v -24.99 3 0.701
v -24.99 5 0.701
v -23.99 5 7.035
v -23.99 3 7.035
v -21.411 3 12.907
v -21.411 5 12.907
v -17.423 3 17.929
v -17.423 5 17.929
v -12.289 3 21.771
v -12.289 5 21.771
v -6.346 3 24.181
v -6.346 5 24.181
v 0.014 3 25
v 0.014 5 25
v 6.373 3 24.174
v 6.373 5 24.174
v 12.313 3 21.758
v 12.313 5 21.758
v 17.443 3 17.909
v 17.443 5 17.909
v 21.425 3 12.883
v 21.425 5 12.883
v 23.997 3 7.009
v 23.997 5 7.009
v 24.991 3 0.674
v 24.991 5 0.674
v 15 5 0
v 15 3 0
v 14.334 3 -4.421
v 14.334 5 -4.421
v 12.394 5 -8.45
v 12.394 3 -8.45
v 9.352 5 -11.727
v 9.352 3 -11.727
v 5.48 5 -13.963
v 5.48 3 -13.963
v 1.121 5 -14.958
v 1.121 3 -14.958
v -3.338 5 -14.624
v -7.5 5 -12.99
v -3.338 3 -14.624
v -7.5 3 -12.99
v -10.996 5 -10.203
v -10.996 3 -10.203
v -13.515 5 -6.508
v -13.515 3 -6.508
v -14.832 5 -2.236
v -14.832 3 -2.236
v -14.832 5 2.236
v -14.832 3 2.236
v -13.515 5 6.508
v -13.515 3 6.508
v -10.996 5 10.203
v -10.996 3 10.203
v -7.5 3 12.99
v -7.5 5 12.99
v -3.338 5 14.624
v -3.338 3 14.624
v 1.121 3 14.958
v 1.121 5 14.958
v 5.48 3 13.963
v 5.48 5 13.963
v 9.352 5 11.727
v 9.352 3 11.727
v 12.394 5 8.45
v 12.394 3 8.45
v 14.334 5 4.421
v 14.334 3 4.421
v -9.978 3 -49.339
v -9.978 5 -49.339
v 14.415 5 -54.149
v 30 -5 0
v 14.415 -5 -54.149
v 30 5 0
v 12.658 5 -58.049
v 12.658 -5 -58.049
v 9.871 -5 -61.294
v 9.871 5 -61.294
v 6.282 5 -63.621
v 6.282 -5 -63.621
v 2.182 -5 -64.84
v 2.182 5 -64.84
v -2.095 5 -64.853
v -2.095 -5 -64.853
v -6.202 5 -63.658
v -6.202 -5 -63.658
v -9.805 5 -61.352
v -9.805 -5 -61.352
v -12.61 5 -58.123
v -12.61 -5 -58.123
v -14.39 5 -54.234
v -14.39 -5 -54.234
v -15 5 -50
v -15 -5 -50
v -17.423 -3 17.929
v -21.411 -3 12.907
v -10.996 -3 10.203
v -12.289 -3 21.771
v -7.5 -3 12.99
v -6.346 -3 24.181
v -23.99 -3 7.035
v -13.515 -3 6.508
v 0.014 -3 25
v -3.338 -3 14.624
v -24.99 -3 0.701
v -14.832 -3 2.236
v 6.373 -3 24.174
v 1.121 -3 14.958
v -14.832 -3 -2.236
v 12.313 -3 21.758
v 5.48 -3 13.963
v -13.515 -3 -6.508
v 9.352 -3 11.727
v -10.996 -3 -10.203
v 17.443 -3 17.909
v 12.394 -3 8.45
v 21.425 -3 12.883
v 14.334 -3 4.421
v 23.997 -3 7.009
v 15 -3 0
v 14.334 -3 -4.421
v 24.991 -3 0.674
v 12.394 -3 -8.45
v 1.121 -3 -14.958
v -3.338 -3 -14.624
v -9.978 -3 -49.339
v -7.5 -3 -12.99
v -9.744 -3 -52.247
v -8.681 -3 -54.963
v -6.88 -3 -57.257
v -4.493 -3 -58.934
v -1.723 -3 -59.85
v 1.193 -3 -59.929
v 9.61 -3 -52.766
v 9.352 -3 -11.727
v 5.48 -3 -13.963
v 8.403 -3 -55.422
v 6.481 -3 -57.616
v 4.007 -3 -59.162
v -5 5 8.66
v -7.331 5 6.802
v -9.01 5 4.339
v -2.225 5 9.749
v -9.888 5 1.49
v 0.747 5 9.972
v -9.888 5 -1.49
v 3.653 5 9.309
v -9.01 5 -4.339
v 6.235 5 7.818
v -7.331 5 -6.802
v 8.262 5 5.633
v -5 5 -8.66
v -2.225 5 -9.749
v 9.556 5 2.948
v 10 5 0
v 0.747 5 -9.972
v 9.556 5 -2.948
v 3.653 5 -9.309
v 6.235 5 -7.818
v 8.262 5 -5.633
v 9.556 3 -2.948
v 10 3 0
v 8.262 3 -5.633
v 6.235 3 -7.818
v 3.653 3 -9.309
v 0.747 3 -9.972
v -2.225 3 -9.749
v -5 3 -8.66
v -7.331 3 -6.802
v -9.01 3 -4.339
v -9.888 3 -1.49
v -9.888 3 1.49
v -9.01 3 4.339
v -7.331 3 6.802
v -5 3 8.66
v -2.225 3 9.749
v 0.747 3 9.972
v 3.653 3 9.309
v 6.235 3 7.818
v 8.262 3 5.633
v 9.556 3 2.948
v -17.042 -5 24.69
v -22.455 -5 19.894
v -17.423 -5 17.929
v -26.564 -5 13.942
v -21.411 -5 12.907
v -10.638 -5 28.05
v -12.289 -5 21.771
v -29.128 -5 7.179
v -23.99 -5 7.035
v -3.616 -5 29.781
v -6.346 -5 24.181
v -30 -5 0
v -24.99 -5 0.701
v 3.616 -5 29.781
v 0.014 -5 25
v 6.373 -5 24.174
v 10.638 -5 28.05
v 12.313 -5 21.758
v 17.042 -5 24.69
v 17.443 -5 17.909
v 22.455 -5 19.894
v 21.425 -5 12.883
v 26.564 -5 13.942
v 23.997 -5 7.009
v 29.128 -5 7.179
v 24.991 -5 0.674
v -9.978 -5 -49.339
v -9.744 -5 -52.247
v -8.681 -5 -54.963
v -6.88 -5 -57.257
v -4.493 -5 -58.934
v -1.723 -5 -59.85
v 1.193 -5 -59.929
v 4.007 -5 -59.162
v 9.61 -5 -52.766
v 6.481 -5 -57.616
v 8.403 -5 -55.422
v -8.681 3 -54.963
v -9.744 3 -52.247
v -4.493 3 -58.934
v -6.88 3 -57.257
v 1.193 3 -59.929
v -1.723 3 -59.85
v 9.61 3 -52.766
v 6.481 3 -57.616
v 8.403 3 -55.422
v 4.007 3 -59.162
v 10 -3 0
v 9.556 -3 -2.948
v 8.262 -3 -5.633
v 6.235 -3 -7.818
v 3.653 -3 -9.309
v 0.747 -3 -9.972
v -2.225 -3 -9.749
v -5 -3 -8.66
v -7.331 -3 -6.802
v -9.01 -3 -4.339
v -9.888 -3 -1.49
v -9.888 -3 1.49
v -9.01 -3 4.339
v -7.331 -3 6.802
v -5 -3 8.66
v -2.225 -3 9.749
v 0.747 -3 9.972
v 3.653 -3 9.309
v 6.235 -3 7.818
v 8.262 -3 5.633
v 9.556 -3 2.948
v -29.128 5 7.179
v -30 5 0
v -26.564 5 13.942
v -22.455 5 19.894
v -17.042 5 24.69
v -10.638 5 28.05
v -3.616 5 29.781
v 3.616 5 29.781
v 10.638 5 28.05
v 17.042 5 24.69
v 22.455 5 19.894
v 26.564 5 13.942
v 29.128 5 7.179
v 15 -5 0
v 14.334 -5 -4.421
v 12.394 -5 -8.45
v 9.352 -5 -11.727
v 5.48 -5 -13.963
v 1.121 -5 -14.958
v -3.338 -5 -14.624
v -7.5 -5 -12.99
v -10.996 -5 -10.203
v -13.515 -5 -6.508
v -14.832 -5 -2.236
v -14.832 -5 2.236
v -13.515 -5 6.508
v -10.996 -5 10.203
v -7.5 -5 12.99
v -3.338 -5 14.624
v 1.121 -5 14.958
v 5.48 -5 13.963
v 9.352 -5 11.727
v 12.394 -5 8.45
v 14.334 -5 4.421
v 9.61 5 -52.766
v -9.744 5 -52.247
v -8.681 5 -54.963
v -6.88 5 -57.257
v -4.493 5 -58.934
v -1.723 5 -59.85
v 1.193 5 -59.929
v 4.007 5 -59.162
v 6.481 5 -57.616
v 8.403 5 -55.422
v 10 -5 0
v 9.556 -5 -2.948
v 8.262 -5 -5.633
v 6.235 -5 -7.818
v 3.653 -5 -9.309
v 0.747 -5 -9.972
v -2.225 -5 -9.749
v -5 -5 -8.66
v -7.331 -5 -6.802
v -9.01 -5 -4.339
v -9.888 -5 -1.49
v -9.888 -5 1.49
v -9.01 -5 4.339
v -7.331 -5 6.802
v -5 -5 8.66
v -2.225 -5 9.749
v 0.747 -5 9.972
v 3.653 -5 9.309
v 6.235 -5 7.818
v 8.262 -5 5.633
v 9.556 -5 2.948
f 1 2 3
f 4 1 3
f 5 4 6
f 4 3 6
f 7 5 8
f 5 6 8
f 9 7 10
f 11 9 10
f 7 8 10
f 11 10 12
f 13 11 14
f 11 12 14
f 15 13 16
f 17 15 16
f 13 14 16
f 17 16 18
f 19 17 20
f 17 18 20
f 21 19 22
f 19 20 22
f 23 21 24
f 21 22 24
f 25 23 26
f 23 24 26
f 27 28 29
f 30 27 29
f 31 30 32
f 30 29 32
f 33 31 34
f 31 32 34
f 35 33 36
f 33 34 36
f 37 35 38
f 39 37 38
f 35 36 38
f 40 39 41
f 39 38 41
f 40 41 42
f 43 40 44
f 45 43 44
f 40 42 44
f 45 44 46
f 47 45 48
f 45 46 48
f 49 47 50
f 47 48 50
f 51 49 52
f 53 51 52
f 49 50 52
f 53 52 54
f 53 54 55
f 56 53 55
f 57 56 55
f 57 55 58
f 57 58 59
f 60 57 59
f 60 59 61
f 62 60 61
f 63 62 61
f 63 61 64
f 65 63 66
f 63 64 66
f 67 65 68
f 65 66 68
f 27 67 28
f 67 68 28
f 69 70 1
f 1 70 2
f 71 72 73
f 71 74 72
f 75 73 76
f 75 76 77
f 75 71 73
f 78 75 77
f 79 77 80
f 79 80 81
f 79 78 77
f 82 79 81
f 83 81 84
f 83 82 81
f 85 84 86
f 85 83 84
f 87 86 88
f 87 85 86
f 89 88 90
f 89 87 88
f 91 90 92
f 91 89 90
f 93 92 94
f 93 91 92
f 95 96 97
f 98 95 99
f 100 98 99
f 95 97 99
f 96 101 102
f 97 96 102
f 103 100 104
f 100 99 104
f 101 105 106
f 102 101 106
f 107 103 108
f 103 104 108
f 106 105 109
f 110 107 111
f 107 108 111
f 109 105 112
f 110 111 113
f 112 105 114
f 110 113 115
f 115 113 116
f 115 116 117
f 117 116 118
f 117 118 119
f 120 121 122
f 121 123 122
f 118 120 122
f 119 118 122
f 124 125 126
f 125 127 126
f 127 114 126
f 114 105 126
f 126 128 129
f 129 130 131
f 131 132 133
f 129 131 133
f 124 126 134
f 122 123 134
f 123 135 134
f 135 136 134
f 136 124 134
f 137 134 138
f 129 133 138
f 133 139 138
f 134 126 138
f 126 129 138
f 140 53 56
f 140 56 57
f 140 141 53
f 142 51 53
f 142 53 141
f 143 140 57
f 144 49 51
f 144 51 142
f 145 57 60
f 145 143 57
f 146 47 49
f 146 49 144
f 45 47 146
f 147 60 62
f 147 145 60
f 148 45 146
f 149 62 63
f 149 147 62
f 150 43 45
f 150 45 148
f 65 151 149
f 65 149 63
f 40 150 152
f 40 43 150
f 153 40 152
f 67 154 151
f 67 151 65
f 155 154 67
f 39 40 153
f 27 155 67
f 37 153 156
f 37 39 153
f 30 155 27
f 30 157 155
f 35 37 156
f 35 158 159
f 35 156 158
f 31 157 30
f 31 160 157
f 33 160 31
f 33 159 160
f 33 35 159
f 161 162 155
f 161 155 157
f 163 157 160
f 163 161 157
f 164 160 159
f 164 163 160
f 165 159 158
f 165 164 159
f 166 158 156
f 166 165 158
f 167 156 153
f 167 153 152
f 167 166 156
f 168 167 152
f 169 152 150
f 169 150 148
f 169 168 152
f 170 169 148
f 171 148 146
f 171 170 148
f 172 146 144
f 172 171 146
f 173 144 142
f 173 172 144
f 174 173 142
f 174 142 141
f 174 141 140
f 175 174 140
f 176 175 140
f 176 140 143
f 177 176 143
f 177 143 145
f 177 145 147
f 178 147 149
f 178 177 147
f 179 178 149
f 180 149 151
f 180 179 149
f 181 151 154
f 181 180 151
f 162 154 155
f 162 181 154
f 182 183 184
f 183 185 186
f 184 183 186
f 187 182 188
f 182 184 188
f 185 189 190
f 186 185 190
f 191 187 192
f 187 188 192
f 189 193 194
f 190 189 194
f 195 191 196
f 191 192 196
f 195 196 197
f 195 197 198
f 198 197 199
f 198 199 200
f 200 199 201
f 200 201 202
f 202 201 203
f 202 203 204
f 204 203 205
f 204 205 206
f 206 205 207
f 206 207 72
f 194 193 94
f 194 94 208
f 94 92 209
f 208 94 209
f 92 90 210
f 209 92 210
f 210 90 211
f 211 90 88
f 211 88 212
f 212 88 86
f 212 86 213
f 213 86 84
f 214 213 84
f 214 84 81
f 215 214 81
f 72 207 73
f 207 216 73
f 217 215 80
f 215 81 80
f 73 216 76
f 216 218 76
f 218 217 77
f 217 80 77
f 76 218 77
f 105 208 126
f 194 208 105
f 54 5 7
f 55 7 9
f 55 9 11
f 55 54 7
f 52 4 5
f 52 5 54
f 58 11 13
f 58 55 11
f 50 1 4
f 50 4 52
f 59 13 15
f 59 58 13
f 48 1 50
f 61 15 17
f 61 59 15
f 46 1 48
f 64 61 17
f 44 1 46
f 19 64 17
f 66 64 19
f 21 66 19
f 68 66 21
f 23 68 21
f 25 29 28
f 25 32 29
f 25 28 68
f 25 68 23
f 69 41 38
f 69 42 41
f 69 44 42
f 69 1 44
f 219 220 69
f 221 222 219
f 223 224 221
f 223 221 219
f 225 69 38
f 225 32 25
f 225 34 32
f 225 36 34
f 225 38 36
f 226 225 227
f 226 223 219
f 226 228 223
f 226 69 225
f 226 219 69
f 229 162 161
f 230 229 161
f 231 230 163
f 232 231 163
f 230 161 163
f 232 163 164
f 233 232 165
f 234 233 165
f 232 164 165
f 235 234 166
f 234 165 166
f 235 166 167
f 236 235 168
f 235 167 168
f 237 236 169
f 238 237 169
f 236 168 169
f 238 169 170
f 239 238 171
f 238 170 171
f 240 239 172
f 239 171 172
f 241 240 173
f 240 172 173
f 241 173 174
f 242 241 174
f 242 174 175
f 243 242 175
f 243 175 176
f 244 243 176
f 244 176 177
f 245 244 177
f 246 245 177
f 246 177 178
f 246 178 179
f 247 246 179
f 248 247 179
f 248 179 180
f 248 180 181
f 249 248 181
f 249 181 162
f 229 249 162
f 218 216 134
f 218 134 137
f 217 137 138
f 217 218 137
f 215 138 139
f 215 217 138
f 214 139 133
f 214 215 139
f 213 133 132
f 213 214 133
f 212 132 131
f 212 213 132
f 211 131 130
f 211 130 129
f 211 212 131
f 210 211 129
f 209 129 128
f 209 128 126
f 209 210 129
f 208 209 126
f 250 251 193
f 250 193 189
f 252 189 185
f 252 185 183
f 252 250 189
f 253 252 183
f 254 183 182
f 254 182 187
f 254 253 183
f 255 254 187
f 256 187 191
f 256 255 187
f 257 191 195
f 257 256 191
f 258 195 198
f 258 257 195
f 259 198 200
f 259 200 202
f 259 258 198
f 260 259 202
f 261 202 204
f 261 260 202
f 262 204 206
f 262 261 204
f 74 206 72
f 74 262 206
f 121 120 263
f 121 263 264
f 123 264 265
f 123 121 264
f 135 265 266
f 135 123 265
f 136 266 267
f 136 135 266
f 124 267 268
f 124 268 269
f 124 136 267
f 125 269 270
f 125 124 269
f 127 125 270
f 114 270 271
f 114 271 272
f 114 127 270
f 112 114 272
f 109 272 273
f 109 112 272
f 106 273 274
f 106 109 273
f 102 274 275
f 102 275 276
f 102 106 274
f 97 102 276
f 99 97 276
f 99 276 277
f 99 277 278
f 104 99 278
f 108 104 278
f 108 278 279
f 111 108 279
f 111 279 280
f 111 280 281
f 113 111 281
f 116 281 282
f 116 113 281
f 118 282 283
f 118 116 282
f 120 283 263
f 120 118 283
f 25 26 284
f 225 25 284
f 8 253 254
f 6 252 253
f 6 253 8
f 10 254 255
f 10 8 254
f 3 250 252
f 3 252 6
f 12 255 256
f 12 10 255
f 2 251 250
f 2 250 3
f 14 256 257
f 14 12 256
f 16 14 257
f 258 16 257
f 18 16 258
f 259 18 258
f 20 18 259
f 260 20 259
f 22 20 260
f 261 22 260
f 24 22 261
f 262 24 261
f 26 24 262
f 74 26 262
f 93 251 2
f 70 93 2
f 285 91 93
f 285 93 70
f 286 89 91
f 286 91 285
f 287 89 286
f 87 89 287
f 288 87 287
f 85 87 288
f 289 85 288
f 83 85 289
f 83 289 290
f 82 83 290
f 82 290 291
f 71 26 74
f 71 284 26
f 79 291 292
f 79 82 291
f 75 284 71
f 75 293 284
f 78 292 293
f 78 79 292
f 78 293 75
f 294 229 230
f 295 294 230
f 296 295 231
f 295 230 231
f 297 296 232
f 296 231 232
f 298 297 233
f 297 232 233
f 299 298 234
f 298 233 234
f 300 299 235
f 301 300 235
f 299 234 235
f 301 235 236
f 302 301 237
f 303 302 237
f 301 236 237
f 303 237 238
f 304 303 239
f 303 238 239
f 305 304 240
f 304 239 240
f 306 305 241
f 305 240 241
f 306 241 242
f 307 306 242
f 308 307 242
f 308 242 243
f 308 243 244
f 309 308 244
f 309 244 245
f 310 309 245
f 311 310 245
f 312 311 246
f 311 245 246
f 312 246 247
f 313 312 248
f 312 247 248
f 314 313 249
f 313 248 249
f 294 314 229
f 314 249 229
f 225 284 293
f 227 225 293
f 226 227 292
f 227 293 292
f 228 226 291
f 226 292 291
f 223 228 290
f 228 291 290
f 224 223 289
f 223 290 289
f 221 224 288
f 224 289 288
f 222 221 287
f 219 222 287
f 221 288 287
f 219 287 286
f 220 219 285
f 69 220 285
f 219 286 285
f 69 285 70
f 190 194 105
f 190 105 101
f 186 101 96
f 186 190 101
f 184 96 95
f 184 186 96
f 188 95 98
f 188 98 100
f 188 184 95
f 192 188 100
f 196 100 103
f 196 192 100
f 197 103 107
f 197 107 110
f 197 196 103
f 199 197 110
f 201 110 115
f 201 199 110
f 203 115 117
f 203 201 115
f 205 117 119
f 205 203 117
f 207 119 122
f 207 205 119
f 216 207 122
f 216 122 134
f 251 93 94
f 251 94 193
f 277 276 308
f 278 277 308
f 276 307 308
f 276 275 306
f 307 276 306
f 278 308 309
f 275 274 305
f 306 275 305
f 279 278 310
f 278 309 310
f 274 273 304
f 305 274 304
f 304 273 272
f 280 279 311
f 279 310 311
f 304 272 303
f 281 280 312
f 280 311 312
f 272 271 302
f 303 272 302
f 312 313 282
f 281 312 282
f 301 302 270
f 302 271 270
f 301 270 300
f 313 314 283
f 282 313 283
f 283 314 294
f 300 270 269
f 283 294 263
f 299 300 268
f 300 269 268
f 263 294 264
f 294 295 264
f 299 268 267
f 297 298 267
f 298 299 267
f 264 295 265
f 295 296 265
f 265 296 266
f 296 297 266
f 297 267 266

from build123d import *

# Parameters (mm, degrees)
BOSS_EXTRUDE1_DEPTH = 5
CUT_EXTRUDE1_DEPTH  = 2
SKETCH3_R           = 10
CUT_EXTRUDE2_DEPTH  = 9
SKETCH4_R           = 15
SKETCH4_R_2         = 10
BOSS_EXTRUDE2_DEPTH = 2


with BuildPart() as part:
    # Sketch1 → Boss-Extrude1 (new body, symmetric)
    with BuildSketch(Plane(origin=(0, 0, 0), x_dir=(1, 0, 0), z_dir=(0, 1, 0))):
        with BuildLine():
            ThreePointArc((14.41480993, 54.148885958), (-2.094976259, 64.852982006), (-15, 50))
            Line((-15, 50), (-30, 0))
            ThreePointArc((-30, 0), (0, -30), (30, 0))
            Line((30, 0), (14.41480993, 54.148885958))
        make_face()
    extrude(amount=BOSS_EXTRUDE1_DEPTH, both=True)

    # Sketch2 → Cut-Extrude1 (cut)
    with BuildSketch(Plane(origin=(0, 5, 0), x_dir=(1, 0, 0), z_dir=(0, 1, 0))):
        with BuildLine():
            Line((24.99092108, -0.673693969), (9.609873286, 52.765923972))
            ThreePointArc((9.609873286, 52.765923972), (-1.723304272, 59.850391992), (-9.978133058, 49.339045626))
            Line((-9.978133058, 49.339045626), (-24.990168055, -0.701071031))
            ThreePointArc((-24.990168055, -0.701071031), (0.013693708, -24.99999625), (24.99092108, -0.673693969))
        make_face()
    cut_extrude1 = extrude(amount=-CUT_EXTRUDE1_DEPTH, mode=Mode.SUBTRACT)

    # Mirror1: Cut-Extrude1 across plane
    add(cut_extrude1.mirror(Plane.ZX), mode=Mode.SUBTRACT)

    # Sketch3 → Cut-Extrude2 (cut, through all)
    with BuildSketch(Plane(origin=(0, 3, 0), x_dir=(1, 0, 0), z_dir=(0, 1, 0))):
        Circle(SKETCH3_R)
    extrude(amount=-CUT_EXTRUDE2_DEPTH, mode=Mode.SUBTRACT)

    # Sketch4 → Boss-Extrude2 (add)
    with BuildSketch(Plane(origin=(0, 3, 0), x_dir=(1, 0, 0), z_dir=(0, 1, 0))):
        Circle(SKETCH4_R)
        Circle(SKETCH4_R_2, mode=Mode.SUBTRACT)
    boss_extrude2 = extrude(amount=BOSS_EXTRUDE2_DEPTH)

    # Mirror2: Boss-Extrude2 across plane
    add(boss_extrude2.mirror(Plane.ZX))


solid = part.part
